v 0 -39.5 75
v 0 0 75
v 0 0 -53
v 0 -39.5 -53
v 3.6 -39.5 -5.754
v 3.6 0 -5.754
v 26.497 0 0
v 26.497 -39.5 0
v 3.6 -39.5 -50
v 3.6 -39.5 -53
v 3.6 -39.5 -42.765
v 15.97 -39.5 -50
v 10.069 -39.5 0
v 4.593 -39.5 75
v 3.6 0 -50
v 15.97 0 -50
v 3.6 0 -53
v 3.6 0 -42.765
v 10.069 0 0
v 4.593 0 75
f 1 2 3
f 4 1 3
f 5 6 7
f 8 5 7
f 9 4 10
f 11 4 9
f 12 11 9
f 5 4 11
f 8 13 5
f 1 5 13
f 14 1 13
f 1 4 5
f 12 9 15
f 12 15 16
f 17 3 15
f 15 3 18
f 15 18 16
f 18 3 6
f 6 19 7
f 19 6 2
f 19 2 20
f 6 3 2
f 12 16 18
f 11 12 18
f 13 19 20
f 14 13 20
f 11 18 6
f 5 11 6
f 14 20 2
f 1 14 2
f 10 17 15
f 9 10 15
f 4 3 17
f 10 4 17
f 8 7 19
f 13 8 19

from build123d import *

# Parameters (mm, degrees)
F1_DEPTH = 39.5


with BuildPart() as f1:
    # F0 (on Front) → F1 (new body)
    with BuildSketch(Plane.XZ):
        Polygon((0, 75), (0, 0), (3.6, 0), (10.06858, 0), (4.592586, 75), align=None)
        Polygon((3.6, 0), (0, 0), (0, -53), (3.6, -53), (3.6, -50), (3.6, -42.764902), (3.6, -5.754051), align=None)
        Polygon((10.06858, 0), (3.6, 0), (3.6, -5.754051), (26.496561, 0), align=None)
        Polygon((15.96995, -50), (3.6, -42.764902), (3.6, -50), align=None)
    extrude(amount=F1_DEPTH)


solid = f1.part
